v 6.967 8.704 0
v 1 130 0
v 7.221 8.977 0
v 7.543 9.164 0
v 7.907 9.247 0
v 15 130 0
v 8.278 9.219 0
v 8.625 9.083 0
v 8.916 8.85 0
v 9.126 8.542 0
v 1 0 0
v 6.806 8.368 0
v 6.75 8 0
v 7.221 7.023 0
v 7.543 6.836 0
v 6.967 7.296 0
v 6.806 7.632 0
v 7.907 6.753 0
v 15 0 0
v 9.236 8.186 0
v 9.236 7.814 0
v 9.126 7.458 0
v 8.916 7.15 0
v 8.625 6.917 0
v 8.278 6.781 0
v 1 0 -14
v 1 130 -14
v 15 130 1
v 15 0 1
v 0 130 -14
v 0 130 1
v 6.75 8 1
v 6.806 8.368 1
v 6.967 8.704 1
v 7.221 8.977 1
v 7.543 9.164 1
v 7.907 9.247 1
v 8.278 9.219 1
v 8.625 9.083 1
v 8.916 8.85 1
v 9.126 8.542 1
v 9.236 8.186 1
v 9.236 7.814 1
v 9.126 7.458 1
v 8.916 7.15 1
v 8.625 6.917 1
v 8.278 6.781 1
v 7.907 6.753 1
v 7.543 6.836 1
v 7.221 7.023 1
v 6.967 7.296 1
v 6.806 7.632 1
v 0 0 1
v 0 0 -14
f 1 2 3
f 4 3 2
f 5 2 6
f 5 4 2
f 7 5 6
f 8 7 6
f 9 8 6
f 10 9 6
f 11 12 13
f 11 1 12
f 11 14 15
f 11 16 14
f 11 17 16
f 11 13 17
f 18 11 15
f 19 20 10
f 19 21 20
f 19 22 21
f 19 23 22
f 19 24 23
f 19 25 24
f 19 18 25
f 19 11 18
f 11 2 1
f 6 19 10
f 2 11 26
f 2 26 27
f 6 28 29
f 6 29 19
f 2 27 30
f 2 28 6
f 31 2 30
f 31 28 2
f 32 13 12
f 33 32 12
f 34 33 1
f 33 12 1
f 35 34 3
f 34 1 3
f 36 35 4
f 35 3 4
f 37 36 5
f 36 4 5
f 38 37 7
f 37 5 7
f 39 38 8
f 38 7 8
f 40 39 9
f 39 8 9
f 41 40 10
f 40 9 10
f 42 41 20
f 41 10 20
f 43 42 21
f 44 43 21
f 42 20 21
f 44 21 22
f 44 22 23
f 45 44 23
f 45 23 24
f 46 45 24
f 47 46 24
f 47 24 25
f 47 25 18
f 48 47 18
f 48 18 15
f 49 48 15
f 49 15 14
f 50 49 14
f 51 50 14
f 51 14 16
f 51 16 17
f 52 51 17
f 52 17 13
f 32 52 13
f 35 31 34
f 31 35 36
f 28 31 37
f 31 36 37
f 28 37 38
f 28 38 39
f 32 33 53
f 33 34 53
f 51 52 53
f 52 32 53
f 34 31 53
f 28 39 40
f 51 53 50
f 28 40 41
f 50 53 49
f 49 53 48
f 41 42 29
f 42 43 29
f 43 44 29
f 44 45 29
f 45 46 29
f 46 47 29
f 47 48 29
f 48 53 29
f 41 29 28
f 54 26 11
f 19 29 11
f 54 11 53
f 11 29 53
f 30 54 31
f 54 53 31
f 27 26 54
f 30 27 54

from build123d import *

# Parameters (mm, degrees)
SKETCH_1_W      = 15
SKETCH_1_H      = 1
EXTRUDE_1_DEPTH = 130
SKETCH_3_W      = 1
SKETCH_3_H      = 130
EXTRUDE_2_DEPTH = 14
M3X0_5_2_D      = 2.5


with BuildPart() as part:
    # ｽｹｯﾁ1 → ﾎﾞｽ - 押し出し1 (new body)
    with BuildSketch(Plane(origin=(0, 0, 0), x_dir=(1, 0, 0), z_dir=(0, 1, 0))):
        with Locations((7.5, -0.5)):
            Rectangle(SKETCH_1_W, SKETCH_1_H)
    extrude(amount=EXTRUDE_1_DEPTH)

    # ｽｹｯﾁ3 → ﾎﾞｽ - 押し出し2 (add)
    with BuildSketch(Plane(origin=(0, 0, 0), x_dir=(-1, 0, 0), z_dir=(0, 0, -1))):
        with Locations((-0.5, 65)):
            Rectangle(SKETCH_3_W, SKETCH_3_H)
    extrude(amount=EXTRUDE_2_DEPTH)

    # M3x0.5 ねじ穴2 (through all)
    with Locations(Plane.XY.offset(1)):
        with Locations((8, 8)):
            Hole(M3X0_5_2_D / 2)


solid = part.part
